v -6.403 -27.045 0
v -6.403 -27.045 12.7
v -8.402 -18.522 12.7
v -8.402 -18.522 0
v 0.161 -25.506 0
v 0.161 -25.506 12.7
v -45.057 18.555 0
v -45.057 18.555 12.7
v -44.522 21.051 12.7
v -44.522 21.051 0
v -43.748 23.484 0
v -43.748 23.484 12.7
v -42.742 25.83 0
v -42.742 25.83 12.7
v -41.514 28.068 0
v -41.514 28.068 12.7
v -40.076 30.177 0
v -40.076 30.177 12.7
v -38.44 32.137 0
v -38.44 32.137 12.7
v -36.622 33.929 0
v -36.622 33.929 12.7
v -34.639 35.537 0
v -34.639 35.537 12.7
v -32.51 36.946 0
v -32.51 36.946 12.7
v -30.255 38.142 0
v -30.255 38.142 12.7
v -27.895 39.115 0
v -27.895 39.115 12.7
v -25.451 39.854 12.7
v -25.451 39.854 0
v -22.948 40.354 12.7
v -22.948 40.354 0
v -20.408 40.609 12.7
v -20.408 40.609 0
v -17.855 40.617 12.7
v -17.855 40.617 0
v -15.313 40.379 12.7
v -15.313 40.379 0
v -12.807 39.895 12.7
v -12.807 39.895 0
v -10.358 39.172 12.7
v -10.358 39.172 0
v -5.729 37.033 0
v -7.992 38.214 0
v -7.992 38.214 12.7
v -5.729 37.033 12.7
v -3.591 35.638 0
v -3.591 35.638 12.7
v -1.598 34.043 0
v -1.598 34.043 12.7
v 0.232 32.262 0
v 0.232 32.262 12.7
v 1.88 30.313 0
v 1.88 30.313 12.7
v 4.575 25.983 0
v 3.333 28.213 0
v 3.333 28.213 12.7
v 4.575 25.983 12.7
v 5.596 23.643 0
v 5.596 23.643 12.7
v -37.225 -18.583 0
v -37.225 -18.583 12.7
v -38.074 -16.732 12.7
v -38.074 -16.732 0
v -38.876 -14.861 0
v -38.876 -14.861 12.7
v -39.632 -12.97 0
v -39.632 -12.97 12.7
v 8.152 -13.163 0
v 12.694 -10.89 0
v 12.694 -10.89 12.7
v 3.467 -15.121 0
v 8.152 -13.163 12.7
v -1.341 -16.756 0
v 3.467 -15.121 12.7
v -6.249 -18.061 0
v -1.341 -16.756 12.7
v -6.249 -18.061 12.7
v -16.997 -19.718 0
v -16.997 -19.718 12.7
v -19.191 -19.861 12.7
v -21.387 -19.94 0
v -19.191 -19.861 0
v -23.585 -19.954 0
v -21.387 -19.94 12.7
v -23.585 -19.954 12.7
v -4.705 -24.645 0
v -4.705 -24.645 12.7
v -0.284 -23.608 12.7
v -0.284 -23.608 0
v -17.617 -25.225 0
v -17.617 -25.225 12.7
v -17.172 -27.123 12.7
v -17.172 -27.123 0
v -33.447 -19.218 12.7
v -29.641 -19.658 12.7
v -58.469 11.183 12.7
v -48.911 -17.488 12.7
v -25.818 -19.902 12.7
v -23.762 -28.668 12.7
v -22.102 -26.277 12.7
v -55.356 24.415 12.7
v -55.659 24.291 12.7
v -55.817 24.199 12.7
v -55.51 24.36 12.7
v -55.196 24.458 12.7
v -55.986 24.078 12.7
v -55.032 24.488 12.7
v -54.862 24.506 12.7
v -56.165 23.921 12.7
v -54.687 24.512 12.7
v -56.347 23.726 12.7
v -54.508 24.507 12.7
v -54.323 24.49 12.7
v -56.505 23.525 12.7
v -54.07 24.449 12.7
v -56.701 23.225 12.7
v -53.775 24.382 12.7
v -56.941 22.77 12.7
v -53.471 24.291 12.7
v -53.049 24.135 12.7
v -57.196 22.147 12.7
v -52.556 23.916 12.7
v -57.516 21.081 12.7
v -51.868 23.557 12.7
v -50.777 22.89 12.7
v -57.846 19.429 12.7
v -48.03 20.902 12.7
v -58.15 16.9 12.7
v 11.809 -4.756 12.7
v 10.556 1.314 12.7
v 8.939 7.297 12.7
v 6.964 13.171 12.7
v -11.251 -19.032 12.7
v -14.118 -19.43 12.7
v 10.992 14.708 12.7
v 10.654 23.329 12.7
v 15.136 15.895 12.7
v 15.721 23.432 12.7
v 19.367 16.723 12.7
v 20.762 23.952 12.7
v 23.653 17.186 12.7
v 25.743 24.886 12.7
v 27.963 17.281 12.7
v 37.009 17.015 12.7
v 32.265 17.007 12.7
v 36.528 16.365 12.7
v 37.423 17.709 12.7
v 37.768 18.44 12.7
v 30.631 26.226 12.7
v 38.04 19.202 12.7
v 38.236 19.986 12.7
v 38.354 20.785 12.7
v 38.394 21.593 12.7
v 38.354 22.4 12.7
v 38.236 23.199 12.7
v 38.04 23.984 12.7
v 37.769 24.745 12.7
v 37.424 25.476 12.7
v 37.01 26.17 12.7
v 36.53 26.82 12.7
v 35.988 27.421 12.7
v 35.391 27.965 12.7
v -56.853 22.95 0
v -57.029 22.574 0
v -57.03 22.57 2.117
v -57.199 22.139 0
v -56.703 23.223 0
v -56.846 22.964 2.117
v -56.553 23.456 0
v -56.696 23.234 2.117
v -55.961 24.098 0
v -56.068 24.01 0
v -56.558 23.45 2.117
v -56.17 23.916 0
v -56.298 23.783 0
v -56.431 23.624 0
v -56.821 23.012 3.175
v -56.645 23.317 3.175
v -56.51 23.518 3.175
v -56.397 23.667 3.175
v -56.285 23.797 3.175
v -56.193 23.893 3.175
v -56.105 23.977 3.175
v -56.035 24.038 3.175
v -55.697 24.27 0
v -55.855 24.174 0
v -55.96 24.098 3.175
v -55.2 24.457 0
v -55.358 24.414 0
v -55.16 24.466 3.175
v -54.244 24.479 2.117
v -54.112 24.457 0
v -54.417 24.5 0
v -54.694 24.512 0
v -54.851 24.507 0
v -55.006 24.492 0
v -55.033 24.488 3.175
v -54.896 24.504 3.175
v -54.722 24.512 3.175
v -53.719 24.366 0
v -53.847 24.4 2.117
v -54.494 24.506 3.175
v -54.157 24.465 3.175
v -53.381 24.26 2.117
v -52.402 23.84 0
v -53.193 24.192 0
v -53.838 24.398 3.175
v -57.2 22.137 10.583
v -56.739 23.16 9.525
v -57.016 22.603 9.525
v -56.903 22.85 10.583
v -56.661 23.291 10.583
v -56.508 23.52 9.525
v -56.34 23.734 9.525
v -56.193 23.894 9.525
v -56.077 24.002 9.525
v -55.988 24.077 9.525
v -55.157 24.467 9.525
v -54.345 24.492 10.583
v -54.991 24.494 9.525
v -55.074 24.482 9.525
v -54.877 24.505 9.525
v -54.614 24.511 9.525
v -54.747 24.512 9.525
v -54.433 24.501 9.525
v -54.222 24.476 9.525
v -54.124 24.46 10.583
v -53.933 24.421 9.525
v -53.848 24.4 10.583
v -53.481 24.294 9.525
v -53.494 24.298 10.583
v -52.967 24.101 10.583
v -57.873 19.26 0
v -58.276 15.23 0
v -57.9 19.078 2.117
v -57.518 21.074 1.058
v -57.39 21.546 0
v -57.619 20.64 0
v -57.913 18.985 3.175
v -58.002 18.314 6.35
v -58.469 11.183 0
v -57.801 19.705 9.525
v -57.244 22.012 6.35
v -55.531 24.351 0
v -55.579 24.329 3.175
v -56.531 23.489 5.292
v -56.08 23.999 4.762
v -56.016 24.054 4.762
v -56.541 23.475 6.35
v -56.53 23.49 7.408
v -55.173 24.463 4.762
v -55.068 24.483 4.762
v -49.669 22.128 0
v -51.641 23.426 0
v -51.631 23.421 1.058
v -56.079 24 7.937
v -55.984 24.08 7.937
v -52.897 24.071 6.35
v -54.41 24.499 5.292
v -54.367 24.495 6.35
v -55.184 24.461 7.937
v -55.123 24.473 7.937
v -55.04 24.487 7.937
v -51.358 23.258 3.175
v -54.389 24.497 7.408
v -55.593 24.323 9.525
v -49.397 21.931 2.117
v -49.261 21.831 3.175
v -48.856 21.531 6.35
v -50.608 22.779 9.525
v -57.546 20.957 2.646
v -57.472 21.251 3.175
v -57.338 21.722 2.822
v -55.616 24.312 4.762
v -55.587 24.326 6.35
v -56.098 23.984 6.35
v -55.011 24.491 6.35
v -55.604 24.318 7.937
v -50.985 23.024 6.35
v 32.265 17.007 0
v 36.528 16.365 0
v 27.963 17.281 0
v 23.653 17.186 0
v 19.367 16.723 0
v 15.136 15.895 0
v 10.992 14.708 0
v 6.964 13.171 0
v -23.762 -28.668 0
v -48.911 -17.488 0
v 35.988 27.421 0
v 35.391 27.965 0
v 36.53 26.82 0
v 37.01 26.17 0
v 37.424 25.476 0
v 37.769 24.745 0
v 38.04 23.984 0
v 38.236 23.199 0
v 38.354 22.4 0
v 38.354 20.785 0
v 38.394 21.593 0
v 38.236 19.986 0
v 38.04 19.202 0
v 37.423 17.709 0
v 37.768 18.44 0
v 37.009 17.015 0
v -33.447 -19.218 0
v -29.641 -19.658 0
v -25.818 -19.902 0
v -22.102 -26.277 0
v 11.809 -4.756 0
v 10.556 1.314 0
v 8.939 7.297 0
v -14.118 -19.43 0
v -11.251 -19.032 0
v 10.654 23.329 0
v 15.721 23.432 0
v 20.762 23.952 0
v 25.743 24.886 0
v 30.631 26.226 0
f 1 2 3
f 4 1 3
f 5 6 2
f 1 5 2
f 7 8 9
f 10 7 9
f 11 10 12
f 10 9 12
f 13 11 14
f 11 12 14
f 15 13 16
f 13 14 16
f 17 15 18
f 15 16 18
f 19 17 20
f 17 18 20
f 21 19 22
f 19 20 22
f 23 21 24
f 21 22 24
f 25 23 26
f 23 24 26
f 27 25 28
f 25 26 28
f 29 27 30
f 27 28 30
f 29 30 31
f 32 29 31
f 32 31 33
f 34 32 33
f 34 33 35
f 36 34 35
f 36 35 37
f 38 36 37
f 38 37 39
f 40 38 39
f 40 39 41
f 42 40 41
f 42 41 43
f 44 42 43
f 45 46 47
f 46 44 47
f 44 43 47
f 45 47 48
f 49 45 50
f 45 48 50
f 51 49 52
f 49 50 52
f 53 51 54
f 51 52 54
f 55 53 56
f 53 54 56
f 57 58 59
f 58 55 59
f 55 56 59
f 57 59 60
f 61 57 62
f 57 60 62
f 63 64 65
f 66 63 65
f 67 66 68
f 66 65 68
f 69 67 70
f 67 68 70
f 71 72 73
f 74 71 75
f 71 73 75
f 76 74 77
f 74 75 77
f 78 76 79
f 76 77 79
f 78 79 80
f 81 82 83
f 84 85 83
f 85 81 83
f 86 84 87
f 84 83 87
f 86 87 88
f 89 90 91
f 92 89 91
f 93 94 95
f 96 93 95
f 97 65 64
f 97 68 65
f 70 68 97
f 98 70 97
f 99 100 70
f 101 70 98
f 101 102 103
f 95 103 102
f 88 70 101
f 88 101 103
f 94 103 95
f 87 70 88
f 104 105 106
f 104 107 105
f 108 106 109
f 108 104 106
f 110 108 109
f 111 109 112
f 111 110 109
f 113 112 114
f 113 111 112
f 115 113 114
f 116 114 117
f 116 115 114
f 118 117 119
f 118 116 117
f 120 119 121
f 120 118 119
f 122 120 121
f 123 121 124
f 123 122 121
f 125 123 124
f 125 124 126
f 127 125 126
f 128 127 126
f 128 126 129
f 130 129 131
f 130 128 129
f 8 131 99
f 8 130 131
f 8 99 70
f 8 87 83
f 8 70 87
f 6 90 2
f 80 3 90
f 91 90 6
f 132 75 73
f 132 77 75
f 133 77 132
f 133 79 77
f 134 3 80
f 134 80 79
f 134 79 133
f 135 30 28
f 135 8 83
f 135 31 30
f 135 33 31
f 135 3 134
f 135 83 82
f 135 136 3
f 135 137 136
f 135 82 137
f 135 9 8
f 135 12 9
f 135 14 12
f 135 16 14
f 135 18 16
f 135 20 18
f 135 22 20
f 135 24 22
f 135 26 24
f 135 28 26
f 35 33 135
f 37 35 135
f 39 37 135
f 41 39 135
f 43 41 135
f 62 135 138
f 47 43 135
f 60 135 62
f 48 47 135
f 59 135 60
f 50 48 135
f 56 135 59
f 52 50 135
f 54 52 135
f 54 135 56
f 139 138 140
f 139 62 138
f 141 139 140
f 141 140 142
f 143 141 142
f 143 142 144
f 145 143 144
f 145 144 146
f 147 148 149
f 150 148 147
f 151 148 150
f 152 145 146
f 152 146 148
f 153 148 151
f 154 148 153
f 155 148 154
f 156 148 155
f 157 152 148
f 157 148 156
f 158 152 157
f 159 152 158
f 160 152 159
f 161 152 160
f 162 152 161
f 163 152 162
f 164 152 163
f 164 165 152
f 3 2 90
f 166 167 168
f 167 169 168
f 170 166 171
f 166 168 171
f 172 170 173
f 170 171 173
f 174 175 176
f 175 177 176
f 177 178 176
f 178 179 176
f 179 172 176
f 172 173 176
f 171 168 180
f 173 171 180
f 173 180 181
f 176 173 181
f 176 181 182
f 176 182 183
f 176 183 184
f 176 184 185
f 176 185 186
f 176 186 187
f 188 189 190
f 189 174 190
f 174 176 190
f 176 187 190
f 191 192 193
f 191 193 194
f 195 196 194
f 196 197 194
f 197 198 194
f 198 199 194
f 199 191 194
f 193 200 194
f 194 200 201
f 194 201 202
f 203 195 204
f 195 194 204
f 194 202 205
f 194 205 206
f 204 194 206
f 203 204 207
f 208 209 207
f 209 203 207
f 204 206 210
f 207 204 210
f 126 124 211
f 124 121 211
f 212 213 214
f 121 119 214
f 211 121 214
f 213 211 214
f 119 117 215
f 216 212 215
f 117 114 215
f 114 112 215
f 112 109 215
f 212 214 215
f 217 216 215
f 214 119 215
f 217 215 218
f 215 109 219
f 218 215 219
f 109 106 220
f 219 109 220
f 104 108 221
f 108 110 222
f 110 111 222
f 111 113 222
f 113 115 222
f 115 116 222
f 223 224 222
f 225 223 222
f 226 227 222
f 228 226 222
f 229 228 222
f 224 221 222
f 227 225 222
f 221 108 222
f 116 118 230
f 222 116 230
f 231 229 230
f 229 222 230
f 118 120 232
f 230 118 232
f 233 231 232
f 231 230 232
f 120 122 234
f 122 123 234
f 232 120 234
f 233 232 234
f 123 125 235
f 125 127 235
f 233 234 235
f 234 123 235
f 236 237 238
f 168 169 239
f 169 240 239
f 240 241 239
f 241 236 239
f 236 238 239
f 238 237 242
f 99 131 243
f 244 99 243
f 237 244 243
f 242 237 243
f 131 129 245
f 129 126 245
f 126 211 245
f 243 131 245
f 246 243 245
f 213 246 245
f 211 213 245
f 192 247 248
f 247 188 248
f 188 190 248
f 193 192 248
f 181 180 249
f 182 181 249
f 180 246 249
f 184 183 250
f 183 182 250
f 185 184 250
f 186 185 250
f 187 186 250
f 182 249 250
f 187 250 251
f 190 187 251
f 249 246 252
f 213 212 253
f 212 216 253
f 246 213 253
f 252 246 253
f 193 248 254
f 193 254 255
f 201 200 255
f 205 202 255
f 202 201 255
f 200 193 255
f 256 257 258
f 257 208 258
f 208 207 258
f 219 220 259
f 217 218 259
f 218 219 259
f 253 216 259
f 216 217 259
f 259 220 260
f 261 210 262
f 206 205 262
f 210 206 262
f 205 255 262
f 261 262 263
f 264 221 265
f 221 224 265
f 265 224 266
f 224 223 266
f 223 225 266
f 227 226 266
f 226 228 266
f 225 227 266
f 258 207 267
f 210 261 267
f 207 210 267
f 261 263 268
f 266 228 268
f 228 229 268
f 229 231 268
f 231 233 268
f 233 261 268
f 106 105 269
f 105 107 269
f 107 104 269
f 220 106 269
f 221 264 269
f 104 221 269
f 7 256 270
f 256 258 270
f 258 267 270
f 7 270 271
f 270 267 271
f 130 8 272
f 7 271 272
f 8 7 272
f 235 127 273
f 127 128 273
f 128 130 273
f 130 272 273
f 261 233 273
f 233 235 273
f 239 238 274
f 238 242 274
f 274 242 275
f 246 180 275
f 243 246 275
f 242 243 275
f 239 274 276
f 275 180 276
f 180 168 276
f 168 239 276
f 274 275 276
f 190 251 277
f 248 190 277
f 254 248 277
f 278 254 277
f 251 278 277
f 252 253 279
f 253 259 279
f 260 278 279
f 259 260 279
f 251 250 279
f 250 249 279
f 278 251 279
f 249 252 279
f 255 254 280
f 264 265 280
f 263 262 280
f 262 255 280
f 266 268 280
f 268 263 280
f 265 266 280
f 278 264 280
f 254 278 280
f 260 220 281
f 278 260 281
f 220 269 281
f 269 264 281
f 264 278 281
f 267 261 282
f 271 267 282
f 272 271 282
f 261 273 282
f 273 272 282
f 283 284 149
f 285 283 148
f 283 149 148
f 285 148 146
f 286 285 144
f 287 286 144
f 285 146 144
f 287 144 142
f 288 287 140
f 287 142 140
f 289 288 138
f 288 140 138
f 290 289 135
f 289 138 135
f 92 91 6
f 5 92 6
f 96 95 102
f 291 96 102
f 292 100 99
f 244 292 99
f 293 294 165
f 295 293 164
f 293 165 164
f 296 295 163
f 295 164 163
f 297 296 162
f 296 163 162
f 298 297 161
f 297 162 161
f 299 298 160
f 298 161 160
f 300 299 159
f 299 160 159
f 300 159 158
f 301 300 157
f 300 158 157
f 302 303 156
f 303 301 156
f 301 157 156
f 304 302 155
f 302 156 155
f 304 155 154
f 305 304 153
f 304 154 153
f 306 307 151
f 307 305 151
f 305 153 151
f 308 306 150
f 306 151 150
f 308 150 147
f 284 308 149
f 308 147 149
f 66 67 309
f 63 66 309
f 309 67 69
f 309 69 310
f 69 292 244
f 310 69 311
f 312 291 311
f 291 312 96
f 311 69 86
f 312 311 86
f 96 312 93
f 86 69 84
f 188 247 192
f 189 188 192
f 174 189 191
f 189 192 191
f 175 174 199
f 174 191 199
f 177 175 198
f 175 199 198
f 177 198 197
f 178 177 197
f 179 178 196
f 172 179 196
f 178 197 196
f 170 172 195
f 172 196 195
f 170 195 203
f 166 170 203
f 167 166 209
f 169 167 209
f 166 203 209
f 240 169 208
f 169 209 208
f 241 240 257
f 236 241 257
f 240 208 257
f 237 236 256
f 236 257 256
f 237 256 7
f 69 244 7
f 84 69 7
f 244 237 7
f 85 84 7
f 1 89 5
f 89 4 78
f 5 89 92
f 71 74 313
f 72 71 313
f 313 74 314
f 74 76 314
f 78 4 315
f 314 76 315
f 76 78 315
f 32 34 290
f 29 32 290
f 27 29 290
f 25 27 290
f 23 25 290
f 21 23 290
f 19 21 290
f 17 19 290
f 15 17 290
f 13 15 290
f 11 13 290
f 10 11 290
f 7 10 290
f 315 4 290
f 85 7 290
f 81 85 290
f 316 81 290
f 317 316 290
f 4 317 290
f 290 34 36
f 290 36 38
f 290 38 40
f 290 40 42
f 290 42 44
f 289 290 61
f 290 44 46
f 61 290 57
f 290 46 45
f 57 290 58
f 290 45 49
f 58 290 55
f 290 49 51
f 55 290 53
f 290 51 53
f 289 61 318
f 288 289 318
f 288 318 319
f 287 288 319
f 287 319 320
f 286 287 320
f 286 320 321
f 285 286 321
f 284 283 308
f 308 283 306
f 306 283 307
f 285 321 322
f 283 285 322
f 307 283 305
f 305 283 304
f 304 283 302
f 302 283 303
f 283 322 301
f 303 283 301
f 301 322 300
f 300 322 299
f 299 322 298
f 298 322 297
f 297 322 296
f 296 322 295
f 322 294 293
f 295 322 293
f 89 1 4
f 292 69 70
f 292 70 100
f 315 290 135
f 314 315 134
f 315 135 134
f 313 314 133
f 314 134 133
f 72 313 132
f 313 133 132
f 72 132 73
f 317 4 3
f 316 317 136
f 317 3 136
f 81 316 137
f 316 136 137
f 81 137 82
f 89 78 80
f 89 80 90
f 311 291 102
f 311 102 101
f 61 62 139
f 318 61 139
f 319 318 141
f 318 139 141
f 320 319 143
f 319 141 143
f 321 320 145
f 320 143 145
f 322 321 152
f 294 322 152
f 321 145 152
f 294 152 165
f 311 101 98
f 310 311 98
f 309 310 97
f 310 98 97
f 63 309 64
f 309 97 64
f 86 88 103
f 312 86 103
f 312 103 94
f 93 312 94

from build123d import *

# Parameters (mm, degrees)
F0_W     = 127
F0_H     = 127
F1_DEPTH = 12.7
F2_W     = 127
F2_H     = 127
F3_DEPTH = 25.4


with BuildPart() as f1:
    # F0 (on Top) → F1 (new body)
    with BuildSketch(Plane.XY):
        with Locations((-5.2748060389, -3.7782490253)):
            Rectangle(F0_W, F0_H)
    extrude(amount=F1_DEPTH)

    # F2 (on face) → F3 (cut)
    with BuildSketch(Plane.XY.offset(12.7)):
        with Locations((-5.2748060389, -3.7782490253)):
            Rectangle(F2_W, F2_H)
        with BuildLine():
            ThreePointArc((-45.0568873794, 18.5549733723), (-21.680808978, 40.5123780124), (5.5957227014, 23.6434871331))
            ThreePointArc((5.5957227014, 23.6434871331), (20.7619644282, 23.9522780163), (35.3910028934, 27.9649421573))
            ThreePointArc((35.3910028934, 27.9649421573), (38.3541893018, 22.3998611891), (36.5282259881, 16.3652561605))
            ThreePointArc((36.5282259881, 16.3652561605), (21.5049263239, 17.0007372687), (6.9639624681, 13.1714110634))
            ThreePointArc((6.9639624681, 13.1714110634), (10.555668828, 1.3136130229), (12.6937493314, -10.8903347278))
            ThreePointArc((12.6937493314, -10.8903347278), (6.4730682144, -13.9075075331), (0, -16.3364153508))
            ThreePointArc((0, -16.3364153508), (-3.1058492811, -17.2664709372), (-6.2491420152, -18.060834795))
            Line((-6.2491420152, -18.060834795), (-4.7052248427, -24.6445921262))
            Line((-4.7052248427, -24.6445921262), (-0.2844387127, -23.6079002679))
            Line((-0.2844387127, -23.6079002679), (0.160669737, -25.505985263))
            Line((0.160669737, -25.505985263), (-6.4033689389, -27.0452783327))
            Line((-6.4033689389, -27.0452783327), (-8.4020764283, -18.5221494234))
            ThreePointArc((-8.4020764283, -18.5221494234), (-12.6823960096, -19.2448601378), (-16.9974779801, -19.7176328979))
            ThreePointArc((-16.9974779801, -19.7176328979), (-20.2884334166, -19.9086672669), (-23.5846133504, -19.9542705577))
            Line((-23.5846133504, -19.9542705577), (-22.1019901652, -26.276650695))
            Line((-22.1019901652, -26.276650695), (-17.6166596284, -25.2248229177))
            Line((-17.6166596284, -25.2248229177), (-17.1715511787, -27.1229079127))
            Line((-17.1715511787, -27.1229079127), (-23.7623452954, -28.6684752393))
            Line((-23.7623452954, -28.6684752393), (-25.8180133273, -19.9024483329))
            ThreePointArc((-25.8180133273, -19.9024483329), (-31.5468119996, -19.4625349649), (-37.2248290455, -18.5834556595))
            ThreePointArc((-37.2248290455, -18.5834556595), (-38.4809946553, -15.7990470828), (-39.6320844368, -12.9695815014))
            Line((-39.6320844368, -12.9695815014), (-48.9112883806, -17.4878127873))
            Line((-48.9112883806, -17.4878127873), (-58.4690012038, 11.1827589571))
            add(Edge.make_bspline(
                [(-58.4690012038, 11.1827589571), (-58.2366652986, 17.2623036133), (-57.6099015071, 28.8951190176), (-49.4002085789, 21.9963852094), (-45.0568873794, 18.5549733723)],
                knots=[0, 0, 0, 0, 0.5142248233, 1, 1, 1, 1], degree=3))
        make_face(mode=Mode.SUBTRACT)
    extrude(amount=-F3_DEPTH, mode=Mode.SUBTRACT)


solid = f1.part
